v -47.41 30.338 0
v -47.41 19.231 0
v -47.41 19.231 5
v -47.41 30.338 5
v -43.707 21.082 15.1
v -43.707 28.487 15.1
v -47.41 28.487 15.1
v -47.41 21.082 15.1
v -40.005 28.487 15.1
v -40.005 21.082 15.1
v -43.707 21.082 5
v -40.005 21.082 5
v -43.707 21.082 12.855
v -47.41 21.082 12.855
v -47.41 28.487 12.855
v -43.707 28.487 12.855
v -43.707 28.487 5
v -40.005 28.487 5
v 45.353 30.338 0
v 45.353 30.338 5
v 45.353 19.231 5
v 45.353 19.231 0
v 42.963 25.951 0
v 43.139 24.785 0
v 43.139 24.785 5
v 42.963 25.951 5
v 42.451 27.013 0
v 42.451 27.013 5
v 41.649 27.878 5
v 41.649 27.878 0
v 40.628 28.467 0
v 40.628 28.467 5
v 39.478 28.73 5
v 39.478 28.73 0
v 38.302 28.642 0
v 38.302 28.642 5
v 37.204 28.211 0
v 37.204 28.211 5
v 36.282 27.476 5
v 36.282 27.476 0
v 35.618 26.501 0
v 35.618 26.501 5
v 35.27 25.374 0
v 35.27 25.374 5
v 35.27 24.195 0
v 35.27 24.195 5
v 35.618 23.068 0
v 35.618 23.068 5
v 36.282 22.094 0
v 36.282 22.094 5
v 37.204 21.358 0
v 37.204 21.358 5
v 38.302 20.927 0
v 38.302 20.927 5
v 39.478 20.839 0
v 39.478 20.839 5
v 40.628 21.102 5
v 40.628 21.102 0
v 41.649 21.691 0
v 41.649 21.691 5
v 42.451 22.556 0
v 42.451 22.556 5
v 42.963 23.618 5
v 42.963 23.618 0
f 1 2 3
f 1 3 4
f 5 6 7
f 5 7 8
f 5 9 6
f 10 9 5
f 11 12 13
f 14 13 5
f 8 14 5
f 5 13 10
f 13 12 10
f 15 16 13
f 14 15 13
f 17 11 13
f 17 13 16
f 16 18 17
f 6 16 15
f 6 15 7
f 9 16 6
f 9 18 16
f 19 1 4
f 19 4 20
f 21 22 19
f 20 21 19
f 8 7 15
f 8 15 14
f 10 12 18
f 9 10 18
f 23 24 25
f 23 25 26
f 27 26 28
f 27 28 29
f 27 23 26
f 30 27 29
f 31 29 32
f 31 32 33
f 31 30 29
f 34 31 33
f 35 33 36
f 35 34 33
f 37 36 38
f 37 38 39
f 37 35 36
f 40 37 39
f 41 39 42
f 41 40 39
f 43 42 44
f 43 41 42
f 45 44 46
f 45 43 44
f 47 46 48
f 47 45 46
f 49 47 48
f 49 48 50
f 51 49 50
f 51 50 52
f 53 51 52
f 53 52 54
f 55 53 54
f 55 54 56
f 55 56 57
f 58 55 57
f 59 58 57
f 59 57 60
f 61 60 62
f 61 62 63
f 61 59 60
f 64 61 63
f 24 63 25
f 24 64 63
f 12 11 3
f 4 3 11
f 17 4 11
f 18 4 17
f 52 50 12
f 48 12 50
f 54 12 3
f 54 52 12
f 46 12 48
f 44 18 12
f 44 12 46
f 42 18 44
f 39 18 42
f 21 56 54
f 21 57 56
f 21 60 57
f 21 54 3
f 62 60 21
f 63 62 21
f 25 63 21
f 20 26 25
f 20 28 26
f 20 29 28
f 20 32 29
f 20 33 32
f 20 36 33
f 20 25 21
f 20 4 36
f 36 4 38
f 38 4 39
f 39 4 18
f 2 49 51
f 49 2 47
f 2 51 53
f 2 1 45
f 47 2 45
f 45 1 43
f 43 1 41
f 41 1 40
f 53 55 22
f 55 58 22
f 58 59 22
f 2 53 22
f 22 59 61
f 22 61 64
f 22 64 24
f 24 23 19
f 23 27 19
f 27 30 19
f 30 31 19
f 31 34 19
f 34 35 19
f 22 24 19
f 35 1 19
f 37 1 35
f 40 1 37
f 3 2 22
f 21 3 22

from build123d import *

# Parameters (mm, degrees)
F0_W     = 92.7622355521
F0_H     = 11.1067872494
F0_R     = 3.9563607237
F0_W_2   = 3.7022642791
F0_H_2   = 7.4045229703
F1_DEPTH = 5
F2_DEPTH = 15.1
F3_W     = 7.4045229703
F3_H     = 2.2449219063
F4_DEPTH = 3.7022568285


with BuildPart() as f1:
    # F0 (on Top) → F1 (new body)
    with BuildSketch(Plane.XY):
        with Locations((-1.0284055024, 24.7845901176)):
            Rectangle(F0_W, F0_H)
        Polygon((-40.0050021708, 28.4868516028), (-36.3027378917, 28.4868516028), (-36.3027378917, 21.0823286325), (-40.0050021708, 21.0823286325), (-43.7072664499, 21.0823286325), (-43.7072664499, 28.4868516028), align=None, mode=Mode.SUBTRACT)
        with Locations((39.1822755337, 24.7845901176)):
            Circle(F0_R, mode=Mode.SUBTRACT)
        with Locations((-38.1538700312, 24.7845901176)):
            Rectangle(F0_W_2, F0_H_2)
    extrude(amount=F1_DEPTH)

    # F0 (on Top) → F2 (join)
    with BuildSketch(Plane.XY):
        with Locations((-41.8561343104, 24.7845901176)):
            Rectangle(F0_W_2, F0_H_2)
    extrude(amount=F2_DEPTH)

    # F3 (on face) → F4 (join, through all)
    with BuildSketch(Plane(origin=(-43.7072664499, 0, 0), x_dir=(0, -1, 0), z_dir=(-1, 0, 0))):
        with Locations((-24.7845901176, 13.9775390469)):
            Rectangle(F3_W, F3_H)
    extrude(amount=F4_DEPTH)


solid = f1.part
